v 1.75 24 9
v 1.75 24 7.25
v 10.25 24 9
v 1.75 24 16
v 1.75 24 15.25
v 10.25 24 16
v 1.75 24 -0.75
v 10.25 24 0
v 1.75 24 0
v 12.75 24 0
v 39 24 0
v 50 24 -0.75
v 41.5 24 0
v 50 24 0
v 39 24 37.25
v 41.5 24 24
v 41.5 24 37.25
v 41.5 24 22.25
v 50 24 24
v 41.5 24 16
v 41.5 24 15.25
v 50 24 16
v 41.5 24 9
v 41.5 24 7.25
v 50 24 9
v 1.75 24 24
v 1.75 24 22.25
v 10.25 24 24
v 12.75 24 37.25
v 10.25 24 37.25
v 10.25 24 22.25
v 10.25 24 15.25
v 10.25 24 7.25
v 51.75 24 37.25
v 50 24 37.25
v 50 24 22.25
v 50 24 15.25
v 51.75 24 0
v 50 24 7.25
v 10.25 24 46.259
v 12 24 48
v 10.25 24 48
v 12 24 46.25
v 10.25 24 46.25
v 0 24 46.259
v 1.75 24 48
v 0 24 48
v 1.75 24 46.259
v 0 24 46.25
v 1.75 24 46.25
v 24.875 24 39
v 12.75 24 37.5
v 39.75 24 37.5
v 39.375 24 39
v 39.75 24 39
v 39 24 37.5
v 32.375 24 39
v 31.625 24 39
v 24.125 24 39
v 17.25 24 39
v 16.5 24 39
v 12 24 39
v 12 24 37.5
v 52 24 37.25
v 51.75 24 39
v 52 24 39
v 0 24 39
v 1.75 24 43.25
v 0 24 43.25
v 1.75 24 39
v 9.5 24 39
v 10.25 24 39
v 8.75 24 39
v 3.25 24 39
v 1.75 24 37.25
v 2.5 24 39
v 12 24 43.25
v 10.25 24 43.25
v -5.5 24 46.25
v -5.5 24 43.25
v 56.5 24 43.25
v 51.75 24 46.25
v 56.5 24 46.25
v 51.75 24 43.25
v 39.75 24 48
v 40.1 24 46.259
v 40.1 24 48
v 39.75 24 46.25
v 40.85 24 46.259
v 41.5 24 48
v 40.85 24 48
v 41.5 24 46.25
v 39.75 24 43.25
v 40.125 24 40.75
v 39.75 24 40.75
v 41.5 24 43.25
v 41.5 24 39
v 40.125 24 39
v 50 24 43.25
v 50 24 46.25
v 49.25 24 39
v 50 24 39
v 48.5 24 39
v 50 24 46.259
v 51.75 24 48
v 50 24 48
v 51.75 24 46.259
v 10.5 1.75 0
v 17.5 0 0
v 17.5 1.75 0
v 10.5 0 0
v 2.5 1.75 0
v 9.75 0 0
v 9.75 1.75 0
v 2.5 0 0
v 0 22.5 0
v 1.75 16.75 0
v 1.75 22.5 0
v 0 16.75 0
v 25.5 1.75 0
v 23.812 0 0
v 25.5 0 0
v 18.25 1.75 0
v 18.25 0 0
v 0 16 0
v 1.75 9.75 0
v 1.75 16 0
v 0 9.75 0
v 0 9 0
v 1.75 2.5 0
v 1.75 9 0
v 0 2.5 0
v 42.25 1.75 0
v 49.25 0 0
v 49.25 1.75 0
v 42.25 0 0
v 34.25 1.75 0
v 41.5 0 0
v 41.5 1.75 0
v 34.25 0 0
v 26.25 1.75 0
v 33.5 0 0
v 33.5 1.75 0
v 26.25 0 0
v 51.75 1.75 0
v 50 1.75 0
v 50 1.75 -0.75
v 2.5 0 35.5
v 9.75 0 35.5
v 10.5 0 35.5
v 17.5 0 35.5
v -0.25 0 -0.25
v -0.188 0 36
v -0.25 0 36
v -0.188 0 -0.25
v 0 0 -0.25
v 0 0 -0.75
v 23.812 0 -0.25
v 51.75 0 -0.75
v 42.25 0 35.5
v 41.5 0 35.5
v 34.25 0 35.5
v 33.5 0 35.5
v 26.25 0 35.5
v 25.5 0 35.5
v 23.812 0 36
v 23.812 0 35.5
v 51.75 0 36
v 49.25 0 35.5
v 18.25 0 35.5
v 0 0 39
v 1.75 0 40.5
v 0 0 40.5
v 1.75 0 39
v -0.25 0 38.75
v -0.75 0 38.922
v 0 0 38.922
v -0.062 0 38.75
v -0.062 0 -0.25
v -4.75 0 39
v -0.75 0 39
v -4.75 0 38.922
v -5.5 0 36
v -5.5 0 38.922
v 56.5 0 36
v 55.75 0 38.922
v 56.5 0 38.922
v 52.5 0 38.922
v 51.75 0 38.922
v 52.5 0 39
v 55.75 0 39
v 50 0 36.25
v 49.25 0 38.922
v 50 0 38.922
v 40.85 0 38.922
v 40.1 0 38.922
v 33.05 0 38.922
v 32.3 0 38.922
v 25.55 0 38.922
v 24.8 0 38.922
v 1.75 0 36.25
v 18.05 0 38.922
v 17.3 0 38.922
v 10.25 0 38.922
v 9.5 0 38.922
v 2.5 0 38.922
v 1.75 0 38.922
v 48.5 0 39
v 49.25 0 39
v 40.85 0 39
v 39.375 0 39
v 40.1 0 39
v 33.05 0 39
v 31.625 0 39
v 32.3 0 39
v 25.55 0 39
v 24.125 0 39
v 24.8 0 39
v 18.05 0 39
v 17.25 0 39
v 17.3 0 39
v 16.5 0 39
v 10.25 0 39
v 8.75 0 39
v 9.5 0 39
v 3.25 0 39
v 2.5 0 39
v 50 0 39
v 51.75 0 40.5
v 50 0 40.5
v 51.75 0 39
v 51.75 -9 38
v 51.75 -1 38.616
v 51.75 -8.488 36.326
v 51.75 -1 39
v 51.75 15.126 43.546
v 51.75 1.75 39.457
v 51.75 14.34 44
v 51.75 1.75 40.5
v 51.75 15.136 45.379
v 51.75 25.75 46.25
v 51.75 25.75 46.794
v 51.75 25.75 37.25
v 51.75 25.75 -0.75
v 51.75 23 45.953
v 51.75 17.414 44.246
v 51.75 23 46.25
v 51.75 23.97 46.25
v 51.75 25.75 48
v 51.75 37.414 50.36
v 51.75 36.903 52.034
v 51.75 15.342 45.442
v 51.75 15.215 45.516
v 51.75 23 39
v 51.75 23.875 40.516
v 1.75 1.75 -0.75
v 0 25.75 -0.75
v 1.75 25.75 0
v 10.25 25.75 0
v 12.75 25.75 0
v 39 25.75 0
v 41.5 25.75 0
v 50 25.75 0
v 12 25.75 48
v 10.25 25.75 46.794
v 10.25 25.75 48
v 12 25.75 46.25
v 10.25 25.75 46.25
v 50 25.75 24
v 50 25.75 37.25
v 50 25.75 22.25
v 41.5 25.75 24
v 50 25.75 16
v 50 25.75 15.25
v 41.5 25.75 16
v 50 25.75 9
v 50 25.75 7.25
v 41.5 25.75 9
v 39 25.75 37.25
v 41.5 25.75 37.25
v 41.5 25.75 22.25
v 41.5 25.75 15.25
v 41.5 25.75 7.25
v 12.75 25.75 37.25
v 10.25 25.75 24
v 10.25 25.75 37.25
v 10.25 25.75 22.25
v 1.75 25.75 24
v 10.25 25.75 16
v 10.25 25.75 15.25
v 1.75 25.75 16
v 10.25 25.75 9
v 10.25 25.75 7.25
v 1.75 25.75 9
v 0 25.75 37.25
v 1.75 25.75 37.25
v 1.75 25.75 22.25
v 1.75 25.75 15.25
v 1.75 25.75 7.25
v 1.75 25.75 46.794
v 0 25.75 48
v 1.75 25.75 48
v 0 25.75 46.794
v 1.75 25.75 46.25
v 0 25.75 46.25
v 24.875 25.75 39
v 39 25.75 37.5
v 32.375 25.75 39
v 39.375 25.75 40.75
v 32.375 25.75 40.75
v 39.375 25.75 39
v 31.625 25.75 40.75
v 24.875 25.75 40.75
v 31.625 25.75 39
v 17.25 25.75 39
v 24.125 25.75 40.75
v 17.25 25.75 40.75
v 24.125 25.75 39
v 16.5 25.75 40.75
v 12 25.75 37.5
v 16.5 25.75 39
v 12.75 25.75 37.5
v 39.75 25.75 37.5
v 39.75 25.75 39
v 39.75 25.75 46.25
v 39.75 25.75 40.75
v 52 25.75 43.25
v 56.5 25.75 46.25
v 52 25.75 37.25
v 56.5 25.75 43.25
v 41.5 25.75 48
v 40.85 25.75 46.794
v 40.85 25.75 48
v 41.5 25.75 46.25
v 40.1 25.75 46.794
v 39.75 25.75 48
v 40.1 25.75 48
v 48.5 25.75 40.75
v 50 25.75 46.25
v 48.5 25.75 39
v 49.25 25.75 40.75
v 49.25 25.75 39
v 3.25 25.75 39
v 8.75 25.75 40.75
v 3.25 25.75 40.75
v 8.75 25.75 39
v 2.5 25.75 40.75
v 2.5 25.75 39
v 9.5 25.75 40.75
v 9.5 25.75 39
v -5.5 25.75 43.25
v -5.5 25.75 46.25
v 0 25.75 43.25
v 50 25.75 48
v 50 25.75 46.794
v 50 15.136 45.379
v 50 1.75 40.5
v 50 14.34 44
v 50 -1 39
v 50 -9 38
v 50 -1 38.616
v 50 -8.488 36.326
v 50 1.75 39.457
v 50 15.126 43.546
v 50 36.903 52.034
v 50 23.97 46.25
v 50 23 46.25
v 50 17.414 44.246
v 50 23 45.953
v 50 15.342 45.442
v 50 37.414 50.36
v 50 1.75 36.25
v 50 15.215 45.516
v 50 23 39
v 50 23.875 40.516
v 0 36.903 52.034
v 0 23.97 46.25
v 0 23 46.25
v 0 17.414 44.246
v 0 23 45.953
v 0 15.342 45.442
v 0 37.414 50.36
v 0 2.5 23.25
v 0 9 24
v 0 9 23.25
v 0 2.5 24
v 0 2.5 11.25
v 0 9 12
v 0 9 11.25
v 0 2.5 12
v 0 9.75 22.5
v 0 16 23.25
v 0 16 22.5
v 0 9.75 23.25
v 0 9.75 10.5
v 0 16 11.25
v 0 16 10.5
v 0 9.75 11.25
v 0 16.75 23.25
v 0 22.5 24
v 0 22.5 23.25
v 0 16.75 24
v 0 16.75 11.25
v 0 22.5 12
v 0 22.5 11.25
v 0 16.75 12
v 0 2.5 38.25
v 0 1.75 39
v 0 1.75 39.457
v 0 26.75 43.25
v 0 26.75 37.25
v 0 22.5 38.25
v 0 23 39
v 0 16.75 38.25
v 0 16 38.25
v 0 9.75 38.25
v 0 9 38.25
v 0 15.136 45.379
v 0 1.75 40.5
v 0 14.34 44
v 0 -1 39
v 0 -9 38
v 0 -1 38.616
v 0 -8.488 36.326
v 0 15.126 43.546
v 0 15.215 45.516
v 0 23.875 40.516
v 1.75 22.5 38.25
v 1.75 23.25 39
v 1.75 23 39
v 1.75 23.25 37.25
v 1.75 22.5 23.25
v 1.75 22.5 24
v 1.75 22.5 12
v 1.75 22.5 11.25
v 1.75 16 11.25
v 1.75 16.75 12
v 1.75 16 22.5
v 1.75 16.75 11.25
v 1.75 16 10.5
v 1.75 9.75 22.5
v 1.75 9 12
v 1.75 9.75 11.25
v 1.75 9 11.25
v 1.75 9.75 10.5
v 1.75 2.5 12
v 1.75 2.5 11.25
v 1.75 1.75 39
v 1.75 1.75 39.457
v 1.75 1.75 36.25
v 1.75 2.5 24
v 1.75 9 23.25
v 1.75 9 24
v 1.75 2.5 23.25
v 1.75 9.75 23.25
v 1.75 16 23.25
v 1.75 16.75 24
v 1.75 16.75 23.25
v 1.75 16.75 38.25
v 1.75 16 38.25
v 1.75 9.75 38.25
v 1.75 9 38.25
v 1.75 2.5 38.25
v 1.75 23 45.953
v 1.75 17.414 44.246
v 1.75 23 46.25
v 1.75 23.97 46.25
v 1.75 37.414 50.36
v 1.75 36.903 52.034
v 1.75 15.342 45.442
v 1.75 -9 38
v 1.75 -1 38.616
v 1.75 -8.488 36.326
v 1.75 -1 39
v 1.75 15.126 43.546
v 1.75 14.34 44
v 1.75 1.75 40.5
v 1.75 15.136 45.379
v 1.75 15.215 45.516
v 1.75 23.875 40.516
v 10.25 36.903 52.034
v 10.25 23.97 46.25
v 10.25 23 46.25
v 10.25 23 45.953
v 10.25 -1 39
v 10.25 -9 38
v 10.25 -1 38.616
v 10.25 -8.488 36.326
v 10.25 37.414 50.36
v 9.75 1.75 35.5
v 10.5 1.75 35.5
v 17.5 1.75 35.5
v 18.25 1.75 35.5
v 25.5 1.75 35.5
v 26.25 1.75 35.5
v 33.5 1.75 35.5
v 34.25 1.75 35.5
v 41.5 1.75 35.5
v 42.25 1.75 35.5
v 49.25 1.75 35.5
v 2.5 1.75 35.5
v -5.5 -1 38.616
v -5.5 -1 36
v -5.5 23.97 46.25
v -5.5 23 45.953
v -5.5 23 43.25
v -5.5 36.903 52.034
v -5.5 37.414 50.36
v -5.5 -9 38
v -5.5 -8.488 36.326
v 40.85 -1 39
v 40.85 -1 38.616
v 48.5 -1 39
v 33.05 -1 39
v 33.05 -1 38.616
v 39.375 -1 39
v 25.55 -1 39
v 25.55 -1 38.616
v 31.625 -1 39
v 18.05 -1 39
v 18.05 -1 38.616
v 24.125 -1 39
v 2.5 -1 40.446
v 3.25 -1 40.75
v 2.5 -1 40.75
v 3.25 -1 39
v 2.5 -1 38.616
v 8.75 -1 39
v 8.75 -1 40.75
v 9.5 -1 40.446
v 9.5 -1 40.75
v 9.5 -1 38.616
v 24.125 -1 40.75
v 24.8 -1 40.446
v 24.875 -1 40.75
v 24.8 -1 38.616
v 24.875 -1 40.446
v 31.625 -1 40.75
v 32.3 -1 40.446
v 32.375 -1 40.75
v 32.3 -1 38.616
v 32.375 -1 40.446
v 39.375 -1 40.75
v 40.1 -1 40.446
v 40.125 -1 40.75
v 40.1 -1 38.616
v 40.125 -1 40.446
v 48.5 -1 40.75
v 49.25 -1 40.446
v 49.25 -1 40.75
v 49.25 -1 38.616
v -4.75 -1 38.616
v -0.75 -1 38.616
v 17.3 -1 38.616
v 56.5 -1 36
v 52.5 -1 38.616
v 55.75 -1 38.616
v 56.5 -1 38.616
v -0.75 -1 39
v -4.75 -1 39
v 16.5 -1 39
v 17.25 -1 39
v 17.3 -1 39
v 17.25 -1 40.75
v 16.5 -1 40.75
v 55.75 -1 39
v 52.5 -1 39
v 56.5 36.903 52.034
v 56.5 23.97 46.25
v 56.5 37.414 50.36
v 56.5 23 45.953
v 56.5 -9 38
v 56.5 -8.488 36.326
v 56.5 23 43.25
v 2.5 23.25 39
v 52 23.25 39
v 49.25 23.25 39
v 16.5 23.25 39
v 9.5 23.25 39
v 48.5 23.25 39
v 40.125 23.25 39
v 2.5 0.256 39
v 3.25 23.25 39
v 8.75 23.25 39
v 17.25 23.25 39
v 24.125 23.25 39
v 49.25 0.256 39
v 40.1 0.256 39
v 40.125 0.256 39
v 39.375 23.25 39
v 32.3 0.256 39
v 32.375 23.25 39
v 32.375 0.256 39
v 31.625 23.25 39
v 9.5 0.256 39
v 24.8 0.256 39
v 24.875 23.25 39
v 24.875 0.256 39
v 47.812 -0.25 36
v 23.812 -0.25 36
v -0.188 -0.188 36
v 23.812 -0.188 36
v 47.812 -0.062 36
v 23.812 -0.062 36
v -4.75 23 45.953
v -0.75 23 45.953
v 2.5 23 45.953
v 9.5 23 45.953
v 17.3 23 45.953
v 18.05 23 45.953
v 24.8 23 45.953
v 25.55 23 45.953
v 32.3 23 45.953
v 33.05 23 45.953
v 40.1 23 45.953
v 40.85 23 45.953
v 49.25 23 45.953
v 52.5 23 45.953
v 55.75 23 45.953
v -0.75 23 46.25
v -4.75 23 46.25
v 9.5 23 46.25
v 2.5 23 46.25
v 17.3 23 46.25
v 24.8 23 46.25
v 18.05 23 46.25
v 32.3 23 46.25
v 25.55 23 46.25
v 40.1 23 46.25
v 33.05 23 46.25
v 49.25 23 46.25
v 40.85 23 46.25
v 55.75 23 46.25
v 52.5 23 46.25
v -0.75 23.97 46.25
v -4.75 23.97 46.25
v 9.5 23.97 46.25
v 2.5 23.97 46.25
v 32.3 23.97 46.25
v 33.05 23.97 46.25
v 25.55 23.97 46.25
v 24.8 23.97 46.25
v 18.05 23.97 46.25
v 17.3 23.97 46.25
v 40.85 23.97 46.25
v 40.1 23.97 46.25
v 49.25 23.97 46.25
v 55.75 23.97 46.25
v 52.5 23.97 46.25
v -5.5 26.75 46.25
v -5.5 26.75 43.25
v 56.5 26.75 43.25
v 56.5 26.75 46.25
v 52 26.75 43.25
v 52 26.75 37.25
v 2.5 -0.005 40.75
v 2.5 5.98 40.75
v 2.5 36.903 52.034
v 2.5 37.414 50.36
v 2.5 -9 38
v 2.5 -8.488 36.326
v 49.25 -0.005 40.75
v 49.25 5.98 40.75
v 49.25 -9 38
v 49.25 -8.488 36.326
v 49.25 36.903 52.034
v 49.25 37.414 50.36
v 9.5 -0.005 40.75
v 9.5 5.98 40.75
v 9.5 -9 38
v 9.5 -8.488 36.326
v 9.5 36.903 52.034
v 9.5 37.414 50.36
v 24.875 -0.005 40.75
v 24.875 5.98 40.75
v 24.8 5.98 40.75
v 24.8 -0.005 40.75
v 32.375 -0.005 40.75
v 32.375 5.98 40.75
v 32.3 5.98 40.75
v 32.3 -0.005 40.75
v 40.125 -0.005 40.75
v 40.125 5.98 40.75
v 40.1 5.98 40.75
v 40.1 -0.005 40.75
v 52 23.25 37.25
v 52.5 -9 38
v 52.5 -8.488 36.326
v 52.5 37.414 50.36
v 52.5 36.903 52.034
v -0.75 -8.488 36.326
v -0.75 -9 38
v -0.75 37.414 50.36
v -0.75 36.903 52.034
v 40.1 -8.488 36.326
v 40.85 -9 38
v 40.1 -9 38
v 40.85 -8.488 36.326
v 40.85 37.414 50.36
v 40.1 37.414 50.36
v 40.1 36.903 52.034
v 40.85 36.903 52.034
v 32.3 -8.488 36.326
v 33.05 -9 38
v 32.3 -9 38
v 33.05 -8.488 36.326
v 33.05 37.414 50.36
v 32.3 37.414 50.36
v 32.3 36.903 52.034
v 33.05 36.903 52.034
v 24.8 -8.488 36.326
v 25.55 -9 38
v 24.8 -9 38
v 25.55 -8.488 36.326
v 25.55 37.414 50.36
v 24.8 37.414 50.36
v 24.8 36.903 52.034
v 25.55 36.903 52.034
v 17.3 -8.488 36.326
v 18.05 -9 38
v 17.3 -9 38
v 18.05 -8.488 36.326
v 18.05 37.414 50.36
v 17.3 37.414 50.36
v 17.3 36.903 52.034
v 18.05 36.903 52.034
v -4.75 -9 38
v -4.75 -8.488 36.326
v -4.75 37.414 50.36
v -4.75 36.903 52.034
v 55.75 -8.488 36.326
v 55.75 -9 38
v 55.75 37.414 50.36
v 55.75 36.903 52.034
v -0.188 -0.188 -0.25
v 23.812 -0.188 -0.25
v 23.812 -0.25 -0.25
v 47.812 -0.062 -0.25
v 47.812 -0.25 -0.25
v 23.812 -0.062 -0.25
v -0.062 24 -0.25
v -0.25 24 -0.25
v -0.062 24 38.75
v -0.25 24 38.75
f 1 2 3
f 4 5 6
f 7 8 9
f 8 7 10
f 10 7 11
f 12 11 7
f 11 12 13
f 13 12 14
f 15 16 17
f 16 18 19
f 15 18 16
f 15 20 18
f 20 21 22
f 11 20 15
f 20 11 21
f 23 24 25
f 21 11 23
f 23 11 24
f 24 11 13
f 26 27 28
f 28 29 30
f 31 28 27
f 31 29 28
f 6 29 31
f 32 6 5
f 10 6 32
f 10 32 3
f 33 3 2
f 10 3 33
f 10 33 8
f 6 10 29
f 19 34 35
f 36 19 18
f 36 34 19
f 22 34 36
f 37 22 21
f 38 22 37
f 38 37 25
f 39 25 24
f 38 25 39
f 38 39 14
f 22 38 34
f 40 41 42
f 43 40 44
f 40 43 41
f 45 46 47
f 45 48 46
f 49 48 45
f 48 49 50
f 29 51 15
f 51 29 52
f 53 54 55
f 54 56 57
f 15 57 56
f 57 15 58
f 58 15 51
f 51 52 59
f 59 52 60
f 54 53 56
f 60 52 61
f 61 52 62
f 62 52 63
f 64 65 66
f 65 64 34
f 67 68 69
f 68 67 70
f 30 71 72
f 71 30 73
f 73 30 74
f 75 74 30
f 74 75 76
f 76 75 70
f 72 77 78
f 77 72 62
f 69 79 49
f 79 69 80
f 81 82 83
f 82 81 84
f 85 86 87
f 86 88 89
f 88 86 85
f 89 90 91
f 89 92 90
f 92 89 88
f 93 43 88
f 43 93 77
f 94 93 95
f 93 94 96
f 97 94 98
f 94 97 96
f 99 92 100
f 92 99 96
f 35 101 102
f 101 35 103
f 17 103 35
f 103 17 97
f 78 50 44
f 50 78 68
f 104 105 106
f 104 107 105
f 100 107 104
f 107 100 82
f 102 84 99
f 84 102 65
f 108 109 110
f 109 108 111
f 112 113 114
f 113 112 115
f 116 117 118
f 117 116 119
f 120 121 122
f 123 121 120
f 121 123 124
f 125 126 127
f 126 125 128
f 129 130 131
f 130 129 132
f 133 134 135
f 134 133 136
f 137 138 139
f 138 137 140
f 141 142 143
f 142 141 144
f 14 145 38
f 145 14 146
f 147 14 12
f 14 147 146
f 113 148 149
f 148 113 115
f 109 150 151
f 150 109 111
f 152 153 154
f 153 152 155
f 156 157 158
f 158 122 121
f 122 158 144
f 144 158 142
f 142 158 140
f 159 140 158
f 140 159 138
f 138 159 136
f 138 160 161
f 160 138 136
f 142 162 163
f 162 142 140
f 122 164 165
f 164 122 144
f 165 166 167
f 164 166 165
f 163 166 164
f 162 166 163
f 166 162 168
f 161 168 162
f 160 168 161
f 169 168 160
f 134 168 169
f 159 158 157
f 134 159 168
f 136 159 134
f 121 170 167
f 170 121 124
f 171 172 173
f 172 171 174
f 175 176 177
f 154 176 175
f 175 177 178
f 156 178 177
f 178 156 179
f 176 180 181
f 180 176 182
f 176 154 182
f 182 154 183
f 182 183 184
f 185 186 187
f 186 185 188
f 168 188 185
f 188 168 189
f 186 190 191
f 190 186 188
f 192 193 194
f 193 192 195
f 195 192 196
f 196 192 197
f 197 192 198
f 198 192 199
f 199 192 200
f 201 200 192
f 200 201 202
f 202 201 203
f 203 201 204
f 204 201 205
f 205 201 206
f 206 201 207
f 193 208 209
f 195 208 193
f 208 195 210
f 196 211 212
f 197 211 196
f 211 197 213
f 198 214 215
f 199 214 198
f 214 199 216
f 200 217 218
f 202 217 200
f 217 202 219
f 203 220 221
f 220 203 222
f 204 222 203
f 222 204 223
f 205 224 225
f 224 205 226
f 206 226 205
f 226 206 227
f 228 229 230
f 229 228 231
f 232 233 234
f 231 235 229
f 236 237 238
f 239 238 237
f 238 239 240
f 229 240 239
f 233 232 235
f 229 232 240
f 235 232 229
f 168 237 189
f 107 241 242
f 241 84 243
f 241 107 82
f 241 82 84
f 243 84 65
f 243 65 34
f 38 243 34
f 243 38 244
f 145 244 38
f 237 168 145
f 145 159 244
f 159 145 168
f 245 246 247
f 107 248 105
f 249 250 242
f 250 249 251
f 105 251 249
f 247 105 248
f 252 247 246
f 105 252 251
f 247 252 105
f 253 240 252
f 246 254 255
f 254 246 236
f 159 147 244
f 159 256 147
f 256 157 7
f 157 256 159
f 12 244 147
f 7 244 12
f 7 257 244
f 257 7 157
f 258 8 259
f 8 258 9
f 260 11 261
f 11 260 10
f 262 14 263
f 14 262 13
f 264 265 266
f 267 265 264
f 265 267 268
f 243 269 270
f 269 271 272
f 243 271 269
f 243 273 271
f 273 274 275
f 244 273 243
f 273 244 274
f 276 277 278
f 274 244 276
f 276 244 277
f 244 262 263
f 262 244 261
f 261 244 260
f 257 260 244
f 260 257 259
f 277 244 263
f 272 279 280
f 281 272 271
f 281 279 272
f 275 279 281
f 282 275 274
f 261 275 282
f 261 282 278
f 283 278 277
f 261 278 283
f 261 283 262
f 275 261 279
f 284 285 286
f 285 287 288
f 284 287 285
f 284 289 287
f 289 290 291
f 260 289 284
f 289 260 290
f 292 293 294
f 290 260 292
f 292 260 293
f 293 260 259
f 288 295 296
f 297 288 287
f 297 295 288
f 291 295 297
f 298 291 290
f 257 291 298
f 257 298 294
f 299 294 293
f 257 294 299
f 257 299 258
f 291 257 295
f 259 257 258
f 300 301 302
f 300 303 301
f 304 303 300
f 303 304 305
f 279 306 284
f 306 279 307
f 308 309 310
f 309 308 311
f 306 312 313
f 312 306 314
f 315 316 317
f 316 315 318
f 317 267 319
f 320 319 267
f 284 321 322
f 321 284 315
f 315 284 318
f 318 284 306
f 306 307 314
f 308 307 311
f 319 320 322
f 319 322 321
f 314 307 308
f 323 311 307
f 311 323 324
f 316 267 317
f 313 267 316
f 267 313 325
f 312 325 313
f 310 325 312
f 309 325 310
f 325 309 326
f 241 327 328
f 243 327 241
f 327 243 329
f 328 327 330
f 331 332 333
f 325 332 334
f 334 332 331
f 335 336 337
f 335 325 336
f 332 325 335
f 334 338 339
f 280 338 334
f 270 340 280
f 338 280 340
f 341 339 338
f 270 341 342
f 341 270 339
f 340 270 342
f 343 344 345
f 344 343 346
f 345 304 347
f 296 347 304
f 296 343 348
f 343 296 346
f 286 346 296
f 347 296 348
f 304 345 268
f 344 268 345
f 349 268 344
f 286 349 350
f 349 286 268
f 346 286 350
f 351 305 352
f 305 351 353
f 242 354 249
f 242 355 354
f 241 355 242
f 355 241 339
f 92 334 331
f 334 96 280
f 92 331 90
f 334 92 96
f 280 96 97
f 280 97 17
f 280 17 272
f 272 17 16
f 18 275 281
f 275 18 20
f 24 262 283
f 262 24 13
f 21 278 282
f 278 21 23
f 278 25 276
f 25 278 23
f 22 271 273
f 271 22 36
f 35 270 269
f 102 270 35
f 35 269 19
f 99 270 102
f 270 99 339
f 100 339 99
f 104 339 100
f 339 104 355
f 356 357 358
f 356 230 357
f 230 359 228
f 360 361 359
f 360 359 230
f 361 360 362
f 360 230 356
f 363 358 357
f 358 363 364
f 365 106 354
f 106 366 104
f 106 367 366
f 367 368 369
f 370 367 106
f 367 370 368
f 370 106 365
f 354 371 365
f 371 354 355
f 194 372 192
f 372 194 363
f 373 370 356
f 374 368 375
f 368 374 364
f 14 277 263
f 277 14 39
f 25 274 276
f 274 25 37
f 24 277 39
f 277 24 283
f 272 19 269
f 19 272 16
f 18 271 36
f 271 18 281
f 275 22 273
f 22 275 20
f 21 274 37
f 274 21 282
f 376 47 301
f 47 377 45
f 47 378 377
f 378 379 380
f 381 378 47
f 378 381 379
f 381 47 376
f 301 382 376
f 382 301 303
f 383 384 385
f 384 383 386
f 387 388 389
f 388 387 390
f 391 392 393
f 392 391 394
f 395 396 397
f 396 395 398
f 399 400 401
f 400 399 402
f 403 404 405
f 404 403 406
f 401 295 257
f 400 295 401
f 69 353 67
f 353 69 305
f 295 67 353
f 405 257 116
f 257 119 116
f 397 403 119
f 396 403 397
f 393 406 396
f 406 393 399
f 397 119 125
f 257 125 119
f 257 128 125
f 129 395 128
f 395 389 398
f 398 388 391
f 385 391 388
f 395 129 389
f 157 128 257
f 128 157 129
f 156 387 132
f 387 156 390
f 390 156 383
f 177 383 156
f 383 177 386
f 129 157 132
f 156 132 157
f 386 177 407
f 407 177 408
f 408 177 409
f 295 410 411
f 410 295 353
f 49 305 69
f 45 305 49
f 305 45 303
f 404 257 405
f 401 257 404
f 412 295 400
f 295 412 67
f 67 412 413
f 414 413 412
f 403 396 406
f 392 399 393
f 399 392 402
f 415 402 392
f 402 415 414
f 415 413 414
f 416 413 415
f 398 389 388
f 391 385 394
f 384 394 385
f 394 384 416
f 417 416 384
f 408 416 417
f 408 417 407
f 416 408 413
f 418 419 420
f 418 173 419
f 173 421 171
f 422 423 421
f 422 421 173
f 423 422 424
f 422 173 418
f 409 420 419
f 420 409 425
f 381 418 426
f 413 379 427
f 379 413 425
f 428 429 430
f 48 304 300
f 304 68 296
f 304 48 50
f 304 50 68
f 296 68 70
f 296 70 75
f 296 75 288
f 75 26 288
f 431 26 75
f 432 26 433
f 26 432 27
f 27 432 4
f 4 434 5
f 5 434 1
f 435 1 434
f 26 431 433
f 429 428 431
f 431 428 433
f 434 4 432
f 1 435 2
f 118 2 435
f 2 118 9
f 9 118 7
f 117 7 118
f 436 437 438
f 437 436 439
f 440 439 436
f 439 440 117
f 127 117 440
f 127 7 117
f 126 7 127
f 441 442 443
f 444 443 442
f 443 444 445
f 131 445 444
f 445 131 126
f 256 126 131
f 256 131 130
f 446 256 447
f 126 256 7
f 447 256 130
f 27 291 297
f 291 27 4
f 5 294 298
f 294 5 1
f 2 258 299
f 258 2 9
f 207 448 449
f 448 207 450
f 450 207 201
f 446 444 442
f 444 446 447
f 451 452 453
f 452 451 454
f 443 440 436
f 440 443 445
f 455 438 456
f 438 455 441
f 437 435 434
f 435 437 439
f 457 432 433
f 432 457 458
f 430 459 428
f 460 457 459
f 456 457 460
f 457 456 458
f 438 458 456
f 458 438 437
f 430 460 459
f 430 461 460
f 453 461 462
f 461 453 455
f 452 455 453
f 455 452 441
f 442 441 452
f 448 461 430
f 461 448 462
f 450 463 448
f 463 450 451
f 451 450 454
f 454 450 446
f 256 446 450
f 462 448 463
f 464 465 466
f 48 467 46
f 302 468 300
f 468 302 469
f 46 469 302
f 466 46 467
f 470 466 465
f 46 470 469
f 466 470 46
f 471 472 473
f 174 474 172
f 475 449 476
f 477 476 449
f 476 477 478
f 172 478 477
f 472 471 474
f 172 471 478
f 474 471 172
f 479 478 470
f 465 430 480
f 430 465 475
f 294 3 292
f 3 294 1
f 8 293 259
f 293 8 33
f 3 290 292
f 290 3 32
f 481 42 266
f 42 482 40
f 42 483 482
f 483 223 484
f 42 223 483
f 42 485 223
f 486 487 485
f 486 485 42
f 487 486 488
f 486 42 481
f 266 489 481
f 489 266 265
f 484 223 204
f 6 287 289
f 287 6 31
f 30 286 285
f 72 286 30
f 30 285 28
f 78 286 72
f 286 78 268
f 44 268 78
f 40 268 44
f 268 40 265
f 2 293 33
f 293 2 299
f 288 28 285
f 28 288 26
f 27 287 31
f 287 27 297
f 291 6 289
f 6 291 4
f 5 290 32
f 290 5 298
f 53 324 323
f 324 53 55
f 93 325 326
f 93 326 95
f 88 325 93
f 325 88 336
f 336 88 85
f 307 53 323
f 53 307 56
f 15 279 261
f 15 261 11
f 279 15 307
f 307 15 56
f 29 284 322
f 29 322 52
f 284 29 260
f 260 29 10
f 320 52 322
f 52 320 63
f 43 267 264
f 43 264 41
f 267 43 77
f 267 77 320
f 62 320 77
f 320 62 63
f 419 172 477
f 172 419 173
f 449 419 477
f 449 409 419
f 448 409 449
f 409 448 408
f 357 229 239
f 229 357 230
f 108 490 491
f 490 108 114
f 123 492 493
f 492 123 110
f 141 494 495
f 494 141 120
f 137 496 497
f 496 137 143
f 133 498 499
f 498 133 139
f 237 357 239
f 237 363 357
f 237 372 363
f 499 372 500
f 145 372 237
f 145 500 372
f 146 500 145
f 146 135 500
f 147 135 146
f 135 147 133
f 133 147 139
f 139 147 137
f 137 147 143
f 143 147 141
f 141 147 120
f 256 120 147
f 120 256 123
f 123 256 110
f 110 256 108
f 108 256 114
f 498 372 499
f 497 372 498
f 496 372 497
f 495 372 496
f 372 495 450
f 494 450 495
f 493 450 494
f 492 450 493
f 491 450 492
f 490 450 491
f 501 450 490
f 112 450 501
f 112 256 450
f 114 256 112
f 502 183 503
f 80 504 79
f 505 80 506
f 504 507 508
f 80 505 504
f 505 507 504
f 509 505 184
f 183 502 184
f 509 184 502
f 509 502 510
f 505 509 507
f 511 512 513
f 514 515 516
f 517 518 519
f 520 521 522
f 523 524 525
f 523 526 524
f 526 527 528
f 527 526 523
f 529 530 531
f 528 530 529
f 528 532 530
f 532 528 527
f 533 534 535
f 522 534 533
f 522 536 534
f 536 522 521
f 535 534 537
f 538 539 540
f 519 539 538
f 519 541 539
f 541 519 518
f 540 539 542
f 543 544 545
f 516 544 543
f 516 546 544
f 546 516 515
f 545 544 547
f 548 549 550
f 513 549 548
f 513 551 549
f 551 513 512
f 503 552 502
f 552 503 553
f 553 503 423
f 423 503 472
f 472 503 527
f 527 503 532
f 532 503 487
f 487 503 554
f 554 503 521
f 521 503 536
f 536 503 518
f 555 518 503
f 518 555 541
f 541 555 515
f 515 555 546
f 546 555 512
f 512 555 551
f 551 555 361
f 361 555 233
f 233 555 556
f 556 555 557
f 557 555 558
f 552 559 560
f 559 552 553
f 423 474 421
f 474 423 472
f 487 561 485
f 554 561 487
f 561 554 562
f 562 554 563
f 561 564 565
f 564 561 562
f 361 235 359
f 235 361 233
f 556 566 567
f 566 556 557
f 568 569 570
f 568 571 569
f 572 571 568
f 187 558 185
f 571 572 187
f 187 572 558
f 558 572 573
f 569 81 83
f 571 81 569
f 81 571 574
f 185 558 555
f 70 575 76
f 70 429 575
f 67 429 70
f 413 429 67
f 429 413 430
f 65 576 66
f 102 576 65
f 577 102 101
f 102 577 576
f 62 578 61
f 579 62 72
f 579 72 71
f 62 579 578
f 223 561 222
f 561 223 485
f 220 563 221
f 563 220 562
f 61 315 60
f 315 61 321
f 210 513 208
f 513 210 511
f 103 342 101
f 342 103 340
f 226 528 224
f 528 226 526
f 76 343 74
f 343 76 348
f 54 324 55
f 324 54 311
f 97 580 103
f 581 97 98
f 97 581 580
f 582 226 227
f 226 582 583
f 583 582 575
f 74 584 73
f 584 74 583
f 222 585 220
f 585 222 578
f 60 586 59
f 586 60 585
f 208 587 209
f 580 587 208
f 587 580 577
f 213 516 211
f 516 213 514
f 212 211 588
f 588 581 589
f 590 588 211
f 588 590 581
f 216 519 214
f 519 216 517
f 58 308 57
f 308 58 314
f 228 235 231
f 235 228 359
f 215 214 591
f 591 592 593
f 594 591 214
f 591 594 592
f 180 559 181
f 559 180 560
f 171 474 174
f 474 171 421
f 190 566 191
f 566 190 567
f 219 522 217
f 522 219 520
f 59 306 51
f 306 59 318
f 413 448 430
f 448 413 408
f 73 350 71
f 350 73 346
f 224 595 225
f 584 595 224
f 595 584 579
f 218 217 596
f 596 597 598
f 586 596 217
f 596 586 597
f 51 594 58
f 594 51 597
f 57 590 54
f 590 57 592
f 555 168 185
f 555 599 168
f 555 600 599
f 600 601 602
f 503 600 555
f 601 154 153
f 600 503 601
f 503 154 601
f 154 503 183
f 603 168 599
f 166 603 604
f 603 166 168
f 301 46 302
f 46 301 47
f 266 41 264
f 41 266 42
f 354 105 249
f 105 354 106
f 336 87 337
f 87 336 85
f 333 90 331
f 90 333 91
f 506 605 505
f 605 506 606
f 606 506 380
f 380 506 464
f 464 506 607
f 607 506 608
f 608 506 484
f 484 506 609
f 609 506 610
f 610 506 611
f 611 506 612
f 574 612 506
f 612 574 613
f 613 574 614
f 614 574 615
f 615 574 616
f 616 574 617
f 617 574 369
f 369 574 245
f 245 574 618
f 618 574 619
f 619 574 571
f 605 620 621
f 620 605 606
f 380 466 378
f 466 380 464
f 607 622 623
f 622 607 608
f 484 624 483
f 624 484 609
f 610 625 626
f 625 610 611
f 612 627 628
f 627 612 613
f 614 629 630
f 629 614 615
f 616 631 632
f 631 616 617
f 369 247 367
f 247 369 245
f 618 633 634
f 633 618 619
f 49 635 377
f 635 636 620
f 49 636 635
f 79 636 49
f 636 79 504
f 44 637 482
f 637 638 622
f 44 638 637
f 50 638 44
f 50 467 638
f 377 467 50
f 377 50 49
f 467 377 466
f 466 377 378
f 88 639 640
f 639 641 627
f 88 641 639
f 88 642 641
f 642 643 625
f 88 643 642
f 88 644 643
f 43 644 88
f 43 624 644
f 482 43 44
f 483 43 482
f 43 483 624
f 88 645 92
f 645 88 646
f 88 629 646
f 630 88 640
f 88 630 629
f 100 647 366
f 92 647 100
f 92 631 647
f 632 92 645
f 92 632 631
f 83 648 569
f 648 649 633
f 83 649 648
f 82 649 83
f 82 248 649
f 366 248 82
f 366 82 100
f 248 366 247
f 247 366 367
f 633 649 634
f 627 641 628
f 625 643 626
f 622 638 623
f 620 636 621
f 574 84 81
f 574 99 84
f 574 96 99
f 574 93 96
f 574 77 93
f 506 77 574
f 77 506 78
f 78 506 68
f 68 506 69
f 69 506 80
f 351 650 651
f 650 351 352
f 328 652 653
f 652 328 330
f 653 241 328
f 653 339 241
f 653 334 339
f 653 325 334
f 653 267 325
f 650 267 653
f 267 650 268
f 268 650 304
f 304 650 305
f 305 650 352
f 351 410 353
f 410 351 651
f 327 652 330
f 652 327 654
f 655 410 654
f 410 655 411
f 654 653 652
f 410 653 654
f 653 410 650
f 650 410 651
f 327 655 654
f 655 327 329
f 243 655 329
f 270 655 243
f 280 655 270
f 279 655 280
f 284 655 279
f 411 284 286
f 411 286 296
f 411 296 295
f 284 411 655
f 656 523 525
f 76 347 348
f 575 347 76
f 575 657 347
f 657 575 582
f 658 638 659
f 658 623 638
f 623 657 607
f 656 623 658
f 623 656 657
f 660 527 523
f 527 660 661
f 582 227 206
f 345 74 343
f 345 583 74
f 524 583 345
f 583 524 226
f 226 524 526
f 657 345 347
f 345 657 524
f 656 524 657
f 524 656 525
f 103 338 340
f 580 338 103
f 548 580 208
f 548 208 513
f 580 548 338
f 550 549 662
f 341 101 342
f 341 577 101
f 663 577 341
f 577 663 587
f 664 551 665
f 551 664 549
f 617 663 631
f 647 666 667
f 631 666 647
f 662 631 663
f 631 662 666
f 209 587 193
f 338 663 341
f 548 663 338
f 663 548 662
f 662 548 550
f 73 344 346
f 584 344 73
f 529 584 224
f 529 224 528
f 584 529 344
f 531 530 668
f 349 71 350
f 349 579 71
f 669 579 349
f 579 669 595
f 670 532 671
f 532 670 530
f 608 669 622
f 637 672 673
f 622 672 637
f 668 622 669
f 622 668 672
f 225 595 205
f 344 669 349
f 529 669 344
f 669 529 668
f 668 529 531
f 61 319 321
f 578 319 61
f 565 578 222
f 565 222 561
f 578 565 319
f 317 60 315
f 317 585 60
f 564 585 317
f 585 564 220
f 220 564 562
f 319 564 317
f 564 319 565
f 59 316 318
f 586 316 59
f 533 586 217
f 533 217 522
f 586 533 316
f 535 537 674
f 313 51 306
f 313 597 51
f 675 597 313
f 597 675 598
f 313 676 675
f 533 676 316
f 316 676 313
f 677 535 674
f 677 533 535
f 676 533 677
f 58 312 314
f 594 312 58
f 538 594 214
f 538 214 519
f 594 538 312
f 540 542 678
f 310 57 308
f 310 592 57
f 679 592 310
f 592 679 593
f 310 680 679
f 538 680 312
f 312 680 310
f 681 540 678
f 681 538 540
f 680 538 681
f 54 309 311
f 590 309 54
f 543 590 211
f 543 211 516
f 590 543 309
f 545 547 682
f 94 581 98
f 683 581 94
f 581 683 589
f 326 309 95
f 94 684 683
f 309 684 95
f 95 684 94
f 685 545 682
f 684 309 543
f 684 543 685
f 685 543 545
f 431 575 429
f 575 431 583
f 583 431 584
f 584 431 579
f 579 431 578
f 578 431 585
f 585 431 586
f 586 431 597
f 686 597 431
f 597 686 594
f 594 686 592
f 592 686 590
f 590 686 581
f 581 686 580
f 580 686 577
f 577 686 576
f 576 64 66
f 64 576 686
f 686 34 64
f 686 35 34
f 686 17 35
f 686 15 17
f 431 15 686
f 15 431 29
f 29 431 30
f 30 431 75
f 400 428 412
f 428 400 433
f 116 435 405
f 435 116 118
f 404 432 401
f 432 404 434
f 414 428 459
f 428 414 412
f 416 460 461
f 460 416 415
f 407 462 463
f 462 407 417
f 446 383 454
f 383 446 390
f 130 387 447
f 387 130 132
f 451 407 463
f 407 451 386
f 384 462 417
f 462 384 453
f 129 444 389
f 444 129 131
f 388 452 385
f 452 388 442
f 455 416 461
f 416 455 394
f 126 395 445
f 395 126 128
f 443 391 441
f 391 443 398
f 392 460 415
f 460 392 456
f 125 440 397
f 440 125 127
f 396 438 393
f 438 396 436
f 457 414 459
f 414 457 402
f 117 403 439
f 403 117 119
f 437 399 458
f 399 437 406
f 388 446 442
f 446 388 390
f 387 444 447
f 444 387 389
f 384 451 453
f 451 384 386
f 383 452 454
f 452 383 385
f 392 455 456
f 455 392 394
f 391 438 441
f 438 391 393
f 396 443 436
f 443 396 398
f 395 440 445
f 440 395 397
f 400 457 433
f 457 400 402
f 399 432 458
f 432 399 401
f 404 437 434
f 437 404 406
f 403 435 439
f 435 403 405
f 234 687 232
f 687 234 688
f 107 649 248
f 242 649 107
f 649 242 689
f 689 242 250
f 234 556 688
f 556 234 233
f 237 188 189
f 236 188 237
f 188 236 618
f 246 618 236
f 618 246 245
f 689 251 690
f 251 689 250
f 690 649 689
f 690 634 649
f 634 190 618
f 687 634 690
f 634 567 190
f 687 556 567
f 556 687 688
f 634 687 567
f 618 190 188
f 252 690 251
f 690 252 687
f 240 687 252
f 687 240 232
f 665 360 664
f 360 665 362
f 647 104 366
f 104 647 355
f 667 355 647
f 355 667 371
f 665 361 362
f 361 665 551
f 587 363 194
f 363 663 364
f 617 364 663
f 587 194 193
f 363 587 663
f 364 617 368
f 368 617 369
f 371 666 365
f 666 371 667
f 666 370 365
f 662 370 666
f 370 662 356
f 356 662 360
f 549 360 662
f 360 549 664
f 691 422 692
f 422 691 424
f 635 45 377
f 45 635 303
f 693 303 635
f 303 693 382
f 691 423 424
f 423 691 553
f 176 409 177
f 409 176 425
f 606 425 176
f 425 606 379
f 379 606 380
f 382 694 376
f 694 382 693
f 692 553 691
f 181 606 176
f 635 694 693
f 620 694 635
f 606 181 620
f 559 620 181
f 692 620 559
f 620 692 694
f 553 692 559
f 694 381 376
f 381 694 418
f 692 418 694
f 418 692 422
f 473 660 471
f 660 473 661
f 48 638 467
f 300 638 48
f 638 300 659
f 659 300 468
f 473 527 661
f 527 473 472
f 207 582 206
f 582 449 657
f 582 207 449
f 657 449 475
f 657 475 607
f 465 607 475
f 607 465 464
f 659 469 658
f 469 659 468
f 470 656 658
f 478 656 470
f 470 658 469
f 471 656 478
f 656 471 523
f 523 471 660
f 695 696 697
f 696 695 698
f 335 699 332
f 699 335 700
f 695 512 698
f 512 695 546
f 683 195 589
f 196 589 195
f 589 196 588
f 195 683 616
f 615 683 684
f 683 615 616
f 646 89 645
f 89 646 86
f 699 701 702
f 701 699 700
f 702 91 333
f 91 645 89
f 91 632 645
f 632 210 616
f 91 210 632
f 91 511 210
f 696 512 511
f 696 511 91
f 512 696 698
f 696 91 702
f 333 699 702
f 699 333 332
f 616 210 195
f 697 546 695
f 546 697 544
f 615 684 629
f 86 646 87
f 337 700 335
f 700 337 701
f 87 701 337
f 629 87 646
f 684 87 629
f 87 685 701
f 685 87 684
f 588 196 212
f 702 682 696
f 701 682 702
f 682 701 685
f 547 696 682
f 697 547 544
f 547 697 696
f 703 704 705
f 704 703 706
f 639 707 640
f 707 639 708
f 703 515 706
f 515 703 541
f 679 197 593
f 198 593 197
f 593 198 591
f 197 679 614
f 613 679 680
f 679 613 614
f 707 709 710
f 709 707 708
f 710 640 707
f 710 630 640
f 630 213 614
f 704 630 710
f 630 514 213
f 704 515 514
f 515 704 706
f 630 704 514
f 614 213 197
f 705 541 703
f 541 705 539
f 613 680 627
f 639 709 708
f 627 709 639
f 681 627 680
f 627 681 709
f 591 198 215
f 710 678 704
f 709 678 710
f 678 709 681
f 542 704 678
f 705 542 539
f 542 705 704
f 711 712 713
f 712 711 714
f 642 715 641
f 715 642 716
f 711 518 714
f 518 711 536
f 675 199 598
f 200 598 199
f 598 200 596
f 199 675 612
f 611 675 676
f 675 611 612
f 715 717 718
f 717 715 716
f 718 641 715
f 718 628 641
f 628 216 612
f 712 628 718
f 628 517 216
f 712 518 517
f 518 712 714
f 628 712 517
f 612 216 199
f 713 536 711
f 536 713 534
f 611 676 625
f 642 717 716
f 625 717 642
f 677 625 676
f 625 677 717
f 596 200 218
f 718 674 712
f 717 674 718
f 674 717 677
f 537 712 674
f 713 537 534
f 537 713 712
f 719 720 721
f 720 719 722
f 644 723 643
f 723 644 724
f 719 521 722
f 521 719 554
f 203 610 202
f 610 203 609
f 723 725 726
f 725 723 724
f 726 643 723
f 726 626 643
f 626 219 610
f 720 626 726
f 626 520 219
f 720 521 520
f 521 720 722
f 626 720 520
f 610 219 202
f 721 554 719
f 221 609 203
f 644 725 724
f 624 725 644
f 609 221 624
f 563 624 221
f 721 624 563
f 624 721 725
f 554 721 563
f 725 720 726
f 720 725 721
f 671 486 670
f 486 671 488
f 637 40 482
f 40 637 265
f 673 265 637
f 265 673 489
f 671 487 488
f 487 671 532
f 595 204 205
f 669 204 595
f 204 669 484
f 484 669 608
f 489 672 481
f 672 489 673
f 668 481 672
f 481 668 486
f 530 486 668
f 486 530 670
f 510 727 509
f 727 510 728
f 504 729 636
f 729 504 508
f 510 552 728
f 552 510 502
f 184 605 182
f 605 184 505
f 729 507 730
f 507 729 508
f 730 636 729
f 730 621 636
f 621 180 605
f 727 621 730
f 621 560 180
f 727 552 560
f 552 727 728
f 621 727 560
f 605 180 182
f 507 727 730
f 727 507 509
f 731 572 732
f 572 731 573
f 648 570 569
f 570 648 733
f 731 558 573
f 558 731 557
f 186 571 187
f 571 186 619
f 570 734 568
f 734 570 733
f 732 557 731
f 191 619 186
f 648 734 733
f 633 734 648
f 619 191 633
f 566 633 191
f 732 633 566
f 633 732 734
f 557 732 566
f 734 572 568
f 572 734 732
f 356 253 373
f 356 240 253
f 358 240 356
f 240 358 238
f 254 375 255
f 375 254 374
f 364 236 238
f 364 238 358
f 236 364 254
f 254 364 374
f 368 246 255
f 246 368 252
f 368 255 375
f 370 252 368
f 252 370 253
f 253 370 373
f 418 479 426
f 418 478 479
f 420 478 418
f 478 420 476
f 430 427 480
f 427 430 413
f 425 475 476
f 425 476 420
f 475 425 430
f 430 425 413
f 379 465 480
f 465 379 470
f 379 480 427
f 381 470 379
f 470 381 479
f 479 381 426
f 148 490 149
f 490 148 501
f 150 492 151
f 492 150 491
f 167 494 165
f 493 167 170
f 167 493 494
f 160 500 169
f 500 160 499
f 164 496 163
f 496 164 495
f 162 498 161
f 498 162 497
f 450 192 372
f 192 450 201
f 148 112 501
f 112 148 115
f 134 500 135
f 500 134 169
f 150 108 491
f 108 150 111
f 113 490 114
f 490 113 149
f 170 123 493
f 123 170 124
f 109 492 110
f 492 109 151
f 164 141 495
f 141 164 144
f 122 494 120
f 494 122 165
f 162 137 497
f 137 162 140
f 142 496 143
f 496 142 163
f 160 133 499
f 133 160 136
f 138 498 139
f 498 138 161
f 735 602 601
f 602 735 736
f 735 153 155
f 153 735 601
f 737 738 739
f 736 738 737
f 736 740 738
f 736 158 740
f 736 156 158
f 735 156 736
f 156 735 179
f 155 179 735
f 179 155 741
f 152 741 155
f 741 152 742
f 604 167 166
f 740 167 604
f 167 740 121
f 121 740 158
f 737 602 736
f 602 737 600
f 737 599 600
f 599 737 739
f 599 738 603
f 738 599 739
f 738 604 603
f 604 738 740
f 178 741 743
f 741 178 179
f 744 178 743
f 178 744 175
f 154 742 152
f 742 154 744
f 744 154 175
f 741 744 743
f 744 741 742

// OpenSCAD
h=96;
sc=0.5;

module b28(length=96){
   cube([1.5,7.25,length]);
}

module b24(length=96){
   cube([1.5,3.5,length]);
}

module rb26(length=96){
   cube([2,6,length]);
}

module b66(length=96){
   cube([5.5,5.5,length]);
}

module b44(length=96){
   cube([3.5,3.5,length]);
}

module b44(length=96){
   cube([3.5,3.5,length]);
}

module p48(length=96){
   cube([.375,48,length]);
}

// ground
//% translate([-100,-100,-1]) cube([200,200,1]);

//front side base plate	
scale(sc,sc) color([1,0.5,1]) translate([103.5,0,0]) rotate([-90,90,0]) b24(length=48);
// inset
scale(sc,sc) color([1,0.5,0]) translate([103.5,51.5,0]) rotate([-90,90,90]) b24(length=100);
scale(sc,sc) color([1,0.5,1]) translate([100,51.5,18]) rotate([-90,90,90]) b44(length=17);
scale(sc,sc) color([1,0.5,1]) translate([100,51.5,48]) rotate([-90,90,90]) b44(length=17);
scale(sc,sc) color([1,0.5,1]) translate([100,51.5,32]) rotate([-90,90,90]) b24(length=17);




//left side base plate	
scale(sc,sc) color([1,0.5,1]) translate([3.5,0,0]) rotate([-90,90,0]) b24(length=48);
// inset
scale(sc,sc) color([1,0.5,0]) translate([25.5,51.5,0]) rotate([-90,90,90]) b24(length=25.5);
scale(sc,sc) color([1,0.5,1]) translate([20.5,51.5,18]) rotate([-90,90,90]) b44(length=17);
scale(sc,sc) color([1,0.5,1]) translate([20.5,51.5,48]) rotate([-90,90,90]) b44(length=17);
scale(sc,sc) color([1,0.5,1]) translate([20.5,51.5,32]) rotate([-90,90,90]) b24(length=17);
//door jack stud
scale(sc,sc) color([1,0.5,1])translate([78,48,0])  b24(length=75);
scale(sc,sc) color([1,0.5,1])translate([24,48,0])  b24(length=75);







// back posts
//outside
scale(sc,sc) translate([0,0,0])  b44(length=81);
// back
scale(sc,sc) translate([100,0,0])  b44(length=81);
scale(sc,sc) color([1,0.5,0]) translate([113,-2,78]) rotate([-90,0,90]) rb26(length=124);



// front posts
//right
scale(sc,sc) translate([0,48,0])  b44(length=96);
// inset right
scale(sc,sc) translate([20.5,48,0])  b44(length=96);
// left
scale(sc,sc) translate([100,48,0])  b44(length=96);
//inset left
scale(sc,sc) translate([79.5,48,0])  b44(length=96);


scale(sc,sc) color([.1,.3,.5]) translate([113,46,92.5]) rotate([-90,0,90]) rb26(length=124);
scale(sc,sc) color([1,0,0]) translate([113,51.5,92.5]) rotate([-90,0,90]) rb26(length=124);
//front face
scale(sc,sc) color([0,0.6,0.9]) translate([104,51.5,86.5]) rotate([-90,0,90]) rb26(length=104);
scale(sc,sc) color([0.5,0.5,0.9]) translate([104,51.5,80.5]) rotate([-90,0,90]) rb26(length=104);
//scale(sc,sc) color([1,1,1]) translate([104,51.5,74.5]) rotate([-90,0,90]) rb26(length=104);


//



// rafter horizontal
// end2
scale(sc,sc) color([1,0,0]) translate([5,51.5,78]) rotate([90,0,0]) b24(length=53.5);
scale(sc,sc) color([1,0,0]) translate([97,51.5,78]) rotate([90,0,0]) b24(length=53.5);
//middle ones
scale(sc,sc) color([1,0,0]) translate([17.5,51.5,78]) rotate([90,0,0]) b24(length=53.5);
scale(sc,sc) color([1,0,0]) translate([33,51.5,78]) rotate([90,0,0]) b24(length=53.5);
scale(sc,sc) color([1,0,0]) translate([48.25,51.5,78]) rotate([90,0,0]) b24(length=53.5);
//scale(sc,sc) color([1,0,0]) translate([54.5,51.5,78]) rotate([90,0,0]) b24(length=53.5);
scale(sc,sc) color([1,0,0]) translate([63.25,51.5,78]) rotate([90,0,0]) b24(length=53.5);
scale(sc,sc) color([1,0,0]) translate([78.75,51.5,78]) rotate([90,0,0]) b24(length=53.5);
//scale(sc,sc) color([1,0,0]) translate([90,51.5,72.5]) rotate([90,0,0]) b24(length=53.5);








// front rafter support
//scale(sc,sc) color([0,1,0]) translate([104,46.5,69.5]) rotate([-90,0,90]) b24(length=104);
scale(sc,sc) color([0,1,0]) translate([104,46.5,78]) rotate([-90,0,90]) b24(length=104);



//right side walls
scale(sc,sc) color([0,0,1]) translate([0,48,0]) rotate([0,0,-90]) b24(length=74.5);
scale(sc,sc) color([1,.7,.7]) translate([0,46.5,0]) rotate([0,0,-90]) b24(length=76.5);//front jack

//scale(sc,sc) color([1,0,0]) translate([0,48,1.5]) rotate([90,90,0]) b24(length=44.5);
scale(sc,sc) color([1,.8,1]) translate([0,5,0]) rotate([0,0,-90]) b24(length=76.5);//back jack
scale(sc,sc) color([0,1,1]) translate([0,46.5,78]) rotate([90,90,0]) b24(length=43);

//Right Wall verticals
scale(sc,sc) color([.7,.0,.5]) translate([0,19.5,0]) rotate([0,0,-90]) b24(length=76.5);
scale(sc,sc) color([.7,.0,.5]) translate([0,33.5,0]) rotate([0,0,-90]) b24(length=76.5);
//scale(sc,sc) color([.7,.0,.5]) translate([0,41,1.5]) rotate([0,0,-90]) b24(length=66.5);
//Right Wall horizontals	
scale(sc,sc) color([.7,.0,.5]) translate([0,18,24]) rotate([0,90,-90]) b24(length=13);
scale(sc,sc) color([.7,.0,.5]) translate([0,18,48]) rotate([0,90,-90]) b24(length=13);
scale(sc,sc) color([.7,.0,.5]) translate([0,18,24]) rotate([0,90,-90]) b24(length=13);
scale(sc,sc) color([.7,.0,.5]) translate([0,32.5,46.5]) rotate([0,90,-90]) b24(length=13);
scale(sc,sc) color([.7,.0,.5]) translate([0,32.5,22.5]) rotate([0,90,-90]) b24(length=13);
scale(sc,sc) color([.7,.0,.5]) translate([0,45.5,48]) rotate([0,90,-90]) b24(length=12.5);
scale(sc,sc) color([.7,.0,.5]) translate([0,45.5,24]) rotate([0,90,-90]) b24(length=12.5);





//left side rafters
scale(sc,sc) color([0,.5,0]) translate([103.5,-18,76]) rotate([-73,0,0]) b24(length=96);
scale(sc,sc) color([0,0.5,0]) translate([98.5,-18,76]) rotate([-73,0,0]) b24(length=96);

//right side rafters
scale(sc,sc) color([0,0.5,0]) translate([-1.5,-18,76]) rotate([-73,0,0]) b24(length=96);
scale(sc,sc) color([0,0.5,0]) translate([3.5,-18,76]) rotate([-73,0,0]) b24(length=96);
// other rafters
//scale(sc,sc) color([0,0.5,0]) translate([88.5,-18,69]) rotate([-67,0,0]) b24(length=96);
scale(sc,sc) color([0,0.5,0]) translate([80.2,-18,76]) rotate([-73,0,0]) b24(length=96);
//scale(sc,sc) color([0,0.5,0]) translate([65.5,-18,69]) rotate([-67,0,0]) b24(length=96);
scale(sc,sc) color([0,0.5,0]) translate([64.6,-18,76]) rotate([-73,0,0]) b24(length=96);
scale(sc,sc) color([0,0.5,0]) translate([49.6,-18,76]) rotate([-73,0,0]) b24(length=96);
scale(sc,sc) color([0,0.5,0]) translate([34.6,-18,76]) rotate([-73,0,0]) b24(length=96);
scale(sc,sc) color([0,0.5,0]) translate([19,-18,76]) rotate([-73,0,0]) b24(length=96);
// end rafters
scale(sc,sc) color([0.1,0.7,0.1]) translate([-11,-18,76]) rotate([-73,0,0]) b24(length=96);
scale(sc,sc) color([.1,0.7,0.1,.8]) translate([111.5,-18,76]) rotate([-73,0,0]) b24(length=96);

//rafter holders
//scale(sc,sc) color([0,1,0]) translate([67,48,88.5]) rotate([0,0,0]) b24(length=7.5);
//scale(sc,sc) color([0,1,1]) translate([68.5,48,69]) rotate([0,0,0]) b24(length=27);
//scale(sc,sc) color([0,1,0]) translate([54.5,48,88.5]) rotate([0,0,0]) b24(length=8);
//scale(sc,sc) color([0,1,1]) translate([56,48,69]) rotate([0,0,0]) b24(length=27.5);
//scale(sc,sc) color([0,1,0]) translate([42,48,88.5]) rotate([0,0,0]) b24(length=8);
//scale(sc,sc) color([0,1,1]) translate([43.5,48,69]) rotate([0,0,0]) b24(length=27.5);
//scale(sc,sc) color([0,1,0]) translate([30.5,48,88.5]) rotate([0,0,0]) b24(length=8);
//scale(sc,sc) color([0,1,1]) translate([32,48,69]) rotate([0,0,0]) b24(length=27.5);
////inside
//scale(sc,sc) color([0,1,0]) translate([18.5,44.5,88.5]) rotate([0,0,0]) b24(length=7);
//scale(sc,sc) color([0,1,1]) translate([20,44.5,69]) rotate([0,0,0]) b24(length=26.5);
//
//scale(sc,sc) color([0,1,0]) translate([78.5,44.5,88.5]) rotate([0,0,0]) b24(length=7);
//scale(sc,sc) color([0,1,1]) translate([80,44.5,69]) rotate([0,0,0]) b24(length=26.5);
//scale(sc,sc) color([0,1,0]) translate([90,44.5,88.5]) rotate([0,0,0]) b24(length=7);
//scale(sc,sc) color([0,1,1]) translate([91.5,44.5,69]) rotate([0,0,0]) b24(length=26.5);




// braces
//front
//scale(sc,sc) translate([1,0,0]) rotate([0,45,0]) b44(length=36);
//scale(sc,sc) translate([6.5,44.5,72]) rotate([0,45,0]) b44(length=30);
//scale(sc,sc) translate([95,44.5,70]) rotate([0,-45,0]) b44(length=30);

//side
scale(sc,sc) translate([100,46,78]) rotate([60,0,0]) b44(length=20);
scale(sc,sc) translate([0,46,78]) rotate([60,0,0]) b44(length=20);
//back
//scale(sc,sc) translate([0,0.25,48]) rotate([0,45,0]) b44(length=34);
//scale(sc,sc) translate([100,0.25,45]) rotate([0,-45,0]) b44(length=34);

// back walls
scale(sc,sc) color([.6,.8,1]) translate([3.5,0,0]) rotate([-90,90,-90]) b24(length=96.5);//foot plate
scale(sc,sc) color([.6,0,1]) translate([3.5,0,72.5]) rotate([-90,90,-90]) b24(length=96.5);//top plate
scale(sc,sc) color([.6,.8,0]) translate([3.5,0,0]) rotate([0,0,0]) b24(length=71);//right side plate
scale(sc,sc) color([.6,.8,0]) translate([98.5,0,0]) rotate([0,0,0]) b24(length=71);//righ(t side plate

// back wall
scale(sc,sc) color([.5,.7,.1]) translate([19.5,0,0]) rotate([0,0,0]) b24(length=71);
scale(sc,sc) color([.5,.7,.1]) translate([35,0,0]) rotate([0,0,0]) b24(length=71);
scale(sc,sc) color([.5,.7,.1]) translate([51,0,0]) rotate([0,0,0]) b24(length=71);
scale(sc,sc) color([.5,.7,.1]) translate([67,0,0]) rotate([0,0,0]) b24(length=71);
scale(sc,sc) color([.5,.7,.1]) translate([83,0,0]) rotate([0,0,0]) b24(length=71);
//plywood
//back wall
scale(sc,sc) color([.5,.7,.1]) translate([47.625,-0.375,-0.5]) rotate([0,0,90]) p48(length=74);
scale(sc,sc) color([.5,.7,.1]) translate([95.625,0-.5,-0.5]) rotate([0,0,90]) p48(length=74);

// right wall
scale(sc,sc) color([.5,.7,.1,.3]) translate([-.5,0,-0.5]) rotate([0,0,0]) p48(length=78);
